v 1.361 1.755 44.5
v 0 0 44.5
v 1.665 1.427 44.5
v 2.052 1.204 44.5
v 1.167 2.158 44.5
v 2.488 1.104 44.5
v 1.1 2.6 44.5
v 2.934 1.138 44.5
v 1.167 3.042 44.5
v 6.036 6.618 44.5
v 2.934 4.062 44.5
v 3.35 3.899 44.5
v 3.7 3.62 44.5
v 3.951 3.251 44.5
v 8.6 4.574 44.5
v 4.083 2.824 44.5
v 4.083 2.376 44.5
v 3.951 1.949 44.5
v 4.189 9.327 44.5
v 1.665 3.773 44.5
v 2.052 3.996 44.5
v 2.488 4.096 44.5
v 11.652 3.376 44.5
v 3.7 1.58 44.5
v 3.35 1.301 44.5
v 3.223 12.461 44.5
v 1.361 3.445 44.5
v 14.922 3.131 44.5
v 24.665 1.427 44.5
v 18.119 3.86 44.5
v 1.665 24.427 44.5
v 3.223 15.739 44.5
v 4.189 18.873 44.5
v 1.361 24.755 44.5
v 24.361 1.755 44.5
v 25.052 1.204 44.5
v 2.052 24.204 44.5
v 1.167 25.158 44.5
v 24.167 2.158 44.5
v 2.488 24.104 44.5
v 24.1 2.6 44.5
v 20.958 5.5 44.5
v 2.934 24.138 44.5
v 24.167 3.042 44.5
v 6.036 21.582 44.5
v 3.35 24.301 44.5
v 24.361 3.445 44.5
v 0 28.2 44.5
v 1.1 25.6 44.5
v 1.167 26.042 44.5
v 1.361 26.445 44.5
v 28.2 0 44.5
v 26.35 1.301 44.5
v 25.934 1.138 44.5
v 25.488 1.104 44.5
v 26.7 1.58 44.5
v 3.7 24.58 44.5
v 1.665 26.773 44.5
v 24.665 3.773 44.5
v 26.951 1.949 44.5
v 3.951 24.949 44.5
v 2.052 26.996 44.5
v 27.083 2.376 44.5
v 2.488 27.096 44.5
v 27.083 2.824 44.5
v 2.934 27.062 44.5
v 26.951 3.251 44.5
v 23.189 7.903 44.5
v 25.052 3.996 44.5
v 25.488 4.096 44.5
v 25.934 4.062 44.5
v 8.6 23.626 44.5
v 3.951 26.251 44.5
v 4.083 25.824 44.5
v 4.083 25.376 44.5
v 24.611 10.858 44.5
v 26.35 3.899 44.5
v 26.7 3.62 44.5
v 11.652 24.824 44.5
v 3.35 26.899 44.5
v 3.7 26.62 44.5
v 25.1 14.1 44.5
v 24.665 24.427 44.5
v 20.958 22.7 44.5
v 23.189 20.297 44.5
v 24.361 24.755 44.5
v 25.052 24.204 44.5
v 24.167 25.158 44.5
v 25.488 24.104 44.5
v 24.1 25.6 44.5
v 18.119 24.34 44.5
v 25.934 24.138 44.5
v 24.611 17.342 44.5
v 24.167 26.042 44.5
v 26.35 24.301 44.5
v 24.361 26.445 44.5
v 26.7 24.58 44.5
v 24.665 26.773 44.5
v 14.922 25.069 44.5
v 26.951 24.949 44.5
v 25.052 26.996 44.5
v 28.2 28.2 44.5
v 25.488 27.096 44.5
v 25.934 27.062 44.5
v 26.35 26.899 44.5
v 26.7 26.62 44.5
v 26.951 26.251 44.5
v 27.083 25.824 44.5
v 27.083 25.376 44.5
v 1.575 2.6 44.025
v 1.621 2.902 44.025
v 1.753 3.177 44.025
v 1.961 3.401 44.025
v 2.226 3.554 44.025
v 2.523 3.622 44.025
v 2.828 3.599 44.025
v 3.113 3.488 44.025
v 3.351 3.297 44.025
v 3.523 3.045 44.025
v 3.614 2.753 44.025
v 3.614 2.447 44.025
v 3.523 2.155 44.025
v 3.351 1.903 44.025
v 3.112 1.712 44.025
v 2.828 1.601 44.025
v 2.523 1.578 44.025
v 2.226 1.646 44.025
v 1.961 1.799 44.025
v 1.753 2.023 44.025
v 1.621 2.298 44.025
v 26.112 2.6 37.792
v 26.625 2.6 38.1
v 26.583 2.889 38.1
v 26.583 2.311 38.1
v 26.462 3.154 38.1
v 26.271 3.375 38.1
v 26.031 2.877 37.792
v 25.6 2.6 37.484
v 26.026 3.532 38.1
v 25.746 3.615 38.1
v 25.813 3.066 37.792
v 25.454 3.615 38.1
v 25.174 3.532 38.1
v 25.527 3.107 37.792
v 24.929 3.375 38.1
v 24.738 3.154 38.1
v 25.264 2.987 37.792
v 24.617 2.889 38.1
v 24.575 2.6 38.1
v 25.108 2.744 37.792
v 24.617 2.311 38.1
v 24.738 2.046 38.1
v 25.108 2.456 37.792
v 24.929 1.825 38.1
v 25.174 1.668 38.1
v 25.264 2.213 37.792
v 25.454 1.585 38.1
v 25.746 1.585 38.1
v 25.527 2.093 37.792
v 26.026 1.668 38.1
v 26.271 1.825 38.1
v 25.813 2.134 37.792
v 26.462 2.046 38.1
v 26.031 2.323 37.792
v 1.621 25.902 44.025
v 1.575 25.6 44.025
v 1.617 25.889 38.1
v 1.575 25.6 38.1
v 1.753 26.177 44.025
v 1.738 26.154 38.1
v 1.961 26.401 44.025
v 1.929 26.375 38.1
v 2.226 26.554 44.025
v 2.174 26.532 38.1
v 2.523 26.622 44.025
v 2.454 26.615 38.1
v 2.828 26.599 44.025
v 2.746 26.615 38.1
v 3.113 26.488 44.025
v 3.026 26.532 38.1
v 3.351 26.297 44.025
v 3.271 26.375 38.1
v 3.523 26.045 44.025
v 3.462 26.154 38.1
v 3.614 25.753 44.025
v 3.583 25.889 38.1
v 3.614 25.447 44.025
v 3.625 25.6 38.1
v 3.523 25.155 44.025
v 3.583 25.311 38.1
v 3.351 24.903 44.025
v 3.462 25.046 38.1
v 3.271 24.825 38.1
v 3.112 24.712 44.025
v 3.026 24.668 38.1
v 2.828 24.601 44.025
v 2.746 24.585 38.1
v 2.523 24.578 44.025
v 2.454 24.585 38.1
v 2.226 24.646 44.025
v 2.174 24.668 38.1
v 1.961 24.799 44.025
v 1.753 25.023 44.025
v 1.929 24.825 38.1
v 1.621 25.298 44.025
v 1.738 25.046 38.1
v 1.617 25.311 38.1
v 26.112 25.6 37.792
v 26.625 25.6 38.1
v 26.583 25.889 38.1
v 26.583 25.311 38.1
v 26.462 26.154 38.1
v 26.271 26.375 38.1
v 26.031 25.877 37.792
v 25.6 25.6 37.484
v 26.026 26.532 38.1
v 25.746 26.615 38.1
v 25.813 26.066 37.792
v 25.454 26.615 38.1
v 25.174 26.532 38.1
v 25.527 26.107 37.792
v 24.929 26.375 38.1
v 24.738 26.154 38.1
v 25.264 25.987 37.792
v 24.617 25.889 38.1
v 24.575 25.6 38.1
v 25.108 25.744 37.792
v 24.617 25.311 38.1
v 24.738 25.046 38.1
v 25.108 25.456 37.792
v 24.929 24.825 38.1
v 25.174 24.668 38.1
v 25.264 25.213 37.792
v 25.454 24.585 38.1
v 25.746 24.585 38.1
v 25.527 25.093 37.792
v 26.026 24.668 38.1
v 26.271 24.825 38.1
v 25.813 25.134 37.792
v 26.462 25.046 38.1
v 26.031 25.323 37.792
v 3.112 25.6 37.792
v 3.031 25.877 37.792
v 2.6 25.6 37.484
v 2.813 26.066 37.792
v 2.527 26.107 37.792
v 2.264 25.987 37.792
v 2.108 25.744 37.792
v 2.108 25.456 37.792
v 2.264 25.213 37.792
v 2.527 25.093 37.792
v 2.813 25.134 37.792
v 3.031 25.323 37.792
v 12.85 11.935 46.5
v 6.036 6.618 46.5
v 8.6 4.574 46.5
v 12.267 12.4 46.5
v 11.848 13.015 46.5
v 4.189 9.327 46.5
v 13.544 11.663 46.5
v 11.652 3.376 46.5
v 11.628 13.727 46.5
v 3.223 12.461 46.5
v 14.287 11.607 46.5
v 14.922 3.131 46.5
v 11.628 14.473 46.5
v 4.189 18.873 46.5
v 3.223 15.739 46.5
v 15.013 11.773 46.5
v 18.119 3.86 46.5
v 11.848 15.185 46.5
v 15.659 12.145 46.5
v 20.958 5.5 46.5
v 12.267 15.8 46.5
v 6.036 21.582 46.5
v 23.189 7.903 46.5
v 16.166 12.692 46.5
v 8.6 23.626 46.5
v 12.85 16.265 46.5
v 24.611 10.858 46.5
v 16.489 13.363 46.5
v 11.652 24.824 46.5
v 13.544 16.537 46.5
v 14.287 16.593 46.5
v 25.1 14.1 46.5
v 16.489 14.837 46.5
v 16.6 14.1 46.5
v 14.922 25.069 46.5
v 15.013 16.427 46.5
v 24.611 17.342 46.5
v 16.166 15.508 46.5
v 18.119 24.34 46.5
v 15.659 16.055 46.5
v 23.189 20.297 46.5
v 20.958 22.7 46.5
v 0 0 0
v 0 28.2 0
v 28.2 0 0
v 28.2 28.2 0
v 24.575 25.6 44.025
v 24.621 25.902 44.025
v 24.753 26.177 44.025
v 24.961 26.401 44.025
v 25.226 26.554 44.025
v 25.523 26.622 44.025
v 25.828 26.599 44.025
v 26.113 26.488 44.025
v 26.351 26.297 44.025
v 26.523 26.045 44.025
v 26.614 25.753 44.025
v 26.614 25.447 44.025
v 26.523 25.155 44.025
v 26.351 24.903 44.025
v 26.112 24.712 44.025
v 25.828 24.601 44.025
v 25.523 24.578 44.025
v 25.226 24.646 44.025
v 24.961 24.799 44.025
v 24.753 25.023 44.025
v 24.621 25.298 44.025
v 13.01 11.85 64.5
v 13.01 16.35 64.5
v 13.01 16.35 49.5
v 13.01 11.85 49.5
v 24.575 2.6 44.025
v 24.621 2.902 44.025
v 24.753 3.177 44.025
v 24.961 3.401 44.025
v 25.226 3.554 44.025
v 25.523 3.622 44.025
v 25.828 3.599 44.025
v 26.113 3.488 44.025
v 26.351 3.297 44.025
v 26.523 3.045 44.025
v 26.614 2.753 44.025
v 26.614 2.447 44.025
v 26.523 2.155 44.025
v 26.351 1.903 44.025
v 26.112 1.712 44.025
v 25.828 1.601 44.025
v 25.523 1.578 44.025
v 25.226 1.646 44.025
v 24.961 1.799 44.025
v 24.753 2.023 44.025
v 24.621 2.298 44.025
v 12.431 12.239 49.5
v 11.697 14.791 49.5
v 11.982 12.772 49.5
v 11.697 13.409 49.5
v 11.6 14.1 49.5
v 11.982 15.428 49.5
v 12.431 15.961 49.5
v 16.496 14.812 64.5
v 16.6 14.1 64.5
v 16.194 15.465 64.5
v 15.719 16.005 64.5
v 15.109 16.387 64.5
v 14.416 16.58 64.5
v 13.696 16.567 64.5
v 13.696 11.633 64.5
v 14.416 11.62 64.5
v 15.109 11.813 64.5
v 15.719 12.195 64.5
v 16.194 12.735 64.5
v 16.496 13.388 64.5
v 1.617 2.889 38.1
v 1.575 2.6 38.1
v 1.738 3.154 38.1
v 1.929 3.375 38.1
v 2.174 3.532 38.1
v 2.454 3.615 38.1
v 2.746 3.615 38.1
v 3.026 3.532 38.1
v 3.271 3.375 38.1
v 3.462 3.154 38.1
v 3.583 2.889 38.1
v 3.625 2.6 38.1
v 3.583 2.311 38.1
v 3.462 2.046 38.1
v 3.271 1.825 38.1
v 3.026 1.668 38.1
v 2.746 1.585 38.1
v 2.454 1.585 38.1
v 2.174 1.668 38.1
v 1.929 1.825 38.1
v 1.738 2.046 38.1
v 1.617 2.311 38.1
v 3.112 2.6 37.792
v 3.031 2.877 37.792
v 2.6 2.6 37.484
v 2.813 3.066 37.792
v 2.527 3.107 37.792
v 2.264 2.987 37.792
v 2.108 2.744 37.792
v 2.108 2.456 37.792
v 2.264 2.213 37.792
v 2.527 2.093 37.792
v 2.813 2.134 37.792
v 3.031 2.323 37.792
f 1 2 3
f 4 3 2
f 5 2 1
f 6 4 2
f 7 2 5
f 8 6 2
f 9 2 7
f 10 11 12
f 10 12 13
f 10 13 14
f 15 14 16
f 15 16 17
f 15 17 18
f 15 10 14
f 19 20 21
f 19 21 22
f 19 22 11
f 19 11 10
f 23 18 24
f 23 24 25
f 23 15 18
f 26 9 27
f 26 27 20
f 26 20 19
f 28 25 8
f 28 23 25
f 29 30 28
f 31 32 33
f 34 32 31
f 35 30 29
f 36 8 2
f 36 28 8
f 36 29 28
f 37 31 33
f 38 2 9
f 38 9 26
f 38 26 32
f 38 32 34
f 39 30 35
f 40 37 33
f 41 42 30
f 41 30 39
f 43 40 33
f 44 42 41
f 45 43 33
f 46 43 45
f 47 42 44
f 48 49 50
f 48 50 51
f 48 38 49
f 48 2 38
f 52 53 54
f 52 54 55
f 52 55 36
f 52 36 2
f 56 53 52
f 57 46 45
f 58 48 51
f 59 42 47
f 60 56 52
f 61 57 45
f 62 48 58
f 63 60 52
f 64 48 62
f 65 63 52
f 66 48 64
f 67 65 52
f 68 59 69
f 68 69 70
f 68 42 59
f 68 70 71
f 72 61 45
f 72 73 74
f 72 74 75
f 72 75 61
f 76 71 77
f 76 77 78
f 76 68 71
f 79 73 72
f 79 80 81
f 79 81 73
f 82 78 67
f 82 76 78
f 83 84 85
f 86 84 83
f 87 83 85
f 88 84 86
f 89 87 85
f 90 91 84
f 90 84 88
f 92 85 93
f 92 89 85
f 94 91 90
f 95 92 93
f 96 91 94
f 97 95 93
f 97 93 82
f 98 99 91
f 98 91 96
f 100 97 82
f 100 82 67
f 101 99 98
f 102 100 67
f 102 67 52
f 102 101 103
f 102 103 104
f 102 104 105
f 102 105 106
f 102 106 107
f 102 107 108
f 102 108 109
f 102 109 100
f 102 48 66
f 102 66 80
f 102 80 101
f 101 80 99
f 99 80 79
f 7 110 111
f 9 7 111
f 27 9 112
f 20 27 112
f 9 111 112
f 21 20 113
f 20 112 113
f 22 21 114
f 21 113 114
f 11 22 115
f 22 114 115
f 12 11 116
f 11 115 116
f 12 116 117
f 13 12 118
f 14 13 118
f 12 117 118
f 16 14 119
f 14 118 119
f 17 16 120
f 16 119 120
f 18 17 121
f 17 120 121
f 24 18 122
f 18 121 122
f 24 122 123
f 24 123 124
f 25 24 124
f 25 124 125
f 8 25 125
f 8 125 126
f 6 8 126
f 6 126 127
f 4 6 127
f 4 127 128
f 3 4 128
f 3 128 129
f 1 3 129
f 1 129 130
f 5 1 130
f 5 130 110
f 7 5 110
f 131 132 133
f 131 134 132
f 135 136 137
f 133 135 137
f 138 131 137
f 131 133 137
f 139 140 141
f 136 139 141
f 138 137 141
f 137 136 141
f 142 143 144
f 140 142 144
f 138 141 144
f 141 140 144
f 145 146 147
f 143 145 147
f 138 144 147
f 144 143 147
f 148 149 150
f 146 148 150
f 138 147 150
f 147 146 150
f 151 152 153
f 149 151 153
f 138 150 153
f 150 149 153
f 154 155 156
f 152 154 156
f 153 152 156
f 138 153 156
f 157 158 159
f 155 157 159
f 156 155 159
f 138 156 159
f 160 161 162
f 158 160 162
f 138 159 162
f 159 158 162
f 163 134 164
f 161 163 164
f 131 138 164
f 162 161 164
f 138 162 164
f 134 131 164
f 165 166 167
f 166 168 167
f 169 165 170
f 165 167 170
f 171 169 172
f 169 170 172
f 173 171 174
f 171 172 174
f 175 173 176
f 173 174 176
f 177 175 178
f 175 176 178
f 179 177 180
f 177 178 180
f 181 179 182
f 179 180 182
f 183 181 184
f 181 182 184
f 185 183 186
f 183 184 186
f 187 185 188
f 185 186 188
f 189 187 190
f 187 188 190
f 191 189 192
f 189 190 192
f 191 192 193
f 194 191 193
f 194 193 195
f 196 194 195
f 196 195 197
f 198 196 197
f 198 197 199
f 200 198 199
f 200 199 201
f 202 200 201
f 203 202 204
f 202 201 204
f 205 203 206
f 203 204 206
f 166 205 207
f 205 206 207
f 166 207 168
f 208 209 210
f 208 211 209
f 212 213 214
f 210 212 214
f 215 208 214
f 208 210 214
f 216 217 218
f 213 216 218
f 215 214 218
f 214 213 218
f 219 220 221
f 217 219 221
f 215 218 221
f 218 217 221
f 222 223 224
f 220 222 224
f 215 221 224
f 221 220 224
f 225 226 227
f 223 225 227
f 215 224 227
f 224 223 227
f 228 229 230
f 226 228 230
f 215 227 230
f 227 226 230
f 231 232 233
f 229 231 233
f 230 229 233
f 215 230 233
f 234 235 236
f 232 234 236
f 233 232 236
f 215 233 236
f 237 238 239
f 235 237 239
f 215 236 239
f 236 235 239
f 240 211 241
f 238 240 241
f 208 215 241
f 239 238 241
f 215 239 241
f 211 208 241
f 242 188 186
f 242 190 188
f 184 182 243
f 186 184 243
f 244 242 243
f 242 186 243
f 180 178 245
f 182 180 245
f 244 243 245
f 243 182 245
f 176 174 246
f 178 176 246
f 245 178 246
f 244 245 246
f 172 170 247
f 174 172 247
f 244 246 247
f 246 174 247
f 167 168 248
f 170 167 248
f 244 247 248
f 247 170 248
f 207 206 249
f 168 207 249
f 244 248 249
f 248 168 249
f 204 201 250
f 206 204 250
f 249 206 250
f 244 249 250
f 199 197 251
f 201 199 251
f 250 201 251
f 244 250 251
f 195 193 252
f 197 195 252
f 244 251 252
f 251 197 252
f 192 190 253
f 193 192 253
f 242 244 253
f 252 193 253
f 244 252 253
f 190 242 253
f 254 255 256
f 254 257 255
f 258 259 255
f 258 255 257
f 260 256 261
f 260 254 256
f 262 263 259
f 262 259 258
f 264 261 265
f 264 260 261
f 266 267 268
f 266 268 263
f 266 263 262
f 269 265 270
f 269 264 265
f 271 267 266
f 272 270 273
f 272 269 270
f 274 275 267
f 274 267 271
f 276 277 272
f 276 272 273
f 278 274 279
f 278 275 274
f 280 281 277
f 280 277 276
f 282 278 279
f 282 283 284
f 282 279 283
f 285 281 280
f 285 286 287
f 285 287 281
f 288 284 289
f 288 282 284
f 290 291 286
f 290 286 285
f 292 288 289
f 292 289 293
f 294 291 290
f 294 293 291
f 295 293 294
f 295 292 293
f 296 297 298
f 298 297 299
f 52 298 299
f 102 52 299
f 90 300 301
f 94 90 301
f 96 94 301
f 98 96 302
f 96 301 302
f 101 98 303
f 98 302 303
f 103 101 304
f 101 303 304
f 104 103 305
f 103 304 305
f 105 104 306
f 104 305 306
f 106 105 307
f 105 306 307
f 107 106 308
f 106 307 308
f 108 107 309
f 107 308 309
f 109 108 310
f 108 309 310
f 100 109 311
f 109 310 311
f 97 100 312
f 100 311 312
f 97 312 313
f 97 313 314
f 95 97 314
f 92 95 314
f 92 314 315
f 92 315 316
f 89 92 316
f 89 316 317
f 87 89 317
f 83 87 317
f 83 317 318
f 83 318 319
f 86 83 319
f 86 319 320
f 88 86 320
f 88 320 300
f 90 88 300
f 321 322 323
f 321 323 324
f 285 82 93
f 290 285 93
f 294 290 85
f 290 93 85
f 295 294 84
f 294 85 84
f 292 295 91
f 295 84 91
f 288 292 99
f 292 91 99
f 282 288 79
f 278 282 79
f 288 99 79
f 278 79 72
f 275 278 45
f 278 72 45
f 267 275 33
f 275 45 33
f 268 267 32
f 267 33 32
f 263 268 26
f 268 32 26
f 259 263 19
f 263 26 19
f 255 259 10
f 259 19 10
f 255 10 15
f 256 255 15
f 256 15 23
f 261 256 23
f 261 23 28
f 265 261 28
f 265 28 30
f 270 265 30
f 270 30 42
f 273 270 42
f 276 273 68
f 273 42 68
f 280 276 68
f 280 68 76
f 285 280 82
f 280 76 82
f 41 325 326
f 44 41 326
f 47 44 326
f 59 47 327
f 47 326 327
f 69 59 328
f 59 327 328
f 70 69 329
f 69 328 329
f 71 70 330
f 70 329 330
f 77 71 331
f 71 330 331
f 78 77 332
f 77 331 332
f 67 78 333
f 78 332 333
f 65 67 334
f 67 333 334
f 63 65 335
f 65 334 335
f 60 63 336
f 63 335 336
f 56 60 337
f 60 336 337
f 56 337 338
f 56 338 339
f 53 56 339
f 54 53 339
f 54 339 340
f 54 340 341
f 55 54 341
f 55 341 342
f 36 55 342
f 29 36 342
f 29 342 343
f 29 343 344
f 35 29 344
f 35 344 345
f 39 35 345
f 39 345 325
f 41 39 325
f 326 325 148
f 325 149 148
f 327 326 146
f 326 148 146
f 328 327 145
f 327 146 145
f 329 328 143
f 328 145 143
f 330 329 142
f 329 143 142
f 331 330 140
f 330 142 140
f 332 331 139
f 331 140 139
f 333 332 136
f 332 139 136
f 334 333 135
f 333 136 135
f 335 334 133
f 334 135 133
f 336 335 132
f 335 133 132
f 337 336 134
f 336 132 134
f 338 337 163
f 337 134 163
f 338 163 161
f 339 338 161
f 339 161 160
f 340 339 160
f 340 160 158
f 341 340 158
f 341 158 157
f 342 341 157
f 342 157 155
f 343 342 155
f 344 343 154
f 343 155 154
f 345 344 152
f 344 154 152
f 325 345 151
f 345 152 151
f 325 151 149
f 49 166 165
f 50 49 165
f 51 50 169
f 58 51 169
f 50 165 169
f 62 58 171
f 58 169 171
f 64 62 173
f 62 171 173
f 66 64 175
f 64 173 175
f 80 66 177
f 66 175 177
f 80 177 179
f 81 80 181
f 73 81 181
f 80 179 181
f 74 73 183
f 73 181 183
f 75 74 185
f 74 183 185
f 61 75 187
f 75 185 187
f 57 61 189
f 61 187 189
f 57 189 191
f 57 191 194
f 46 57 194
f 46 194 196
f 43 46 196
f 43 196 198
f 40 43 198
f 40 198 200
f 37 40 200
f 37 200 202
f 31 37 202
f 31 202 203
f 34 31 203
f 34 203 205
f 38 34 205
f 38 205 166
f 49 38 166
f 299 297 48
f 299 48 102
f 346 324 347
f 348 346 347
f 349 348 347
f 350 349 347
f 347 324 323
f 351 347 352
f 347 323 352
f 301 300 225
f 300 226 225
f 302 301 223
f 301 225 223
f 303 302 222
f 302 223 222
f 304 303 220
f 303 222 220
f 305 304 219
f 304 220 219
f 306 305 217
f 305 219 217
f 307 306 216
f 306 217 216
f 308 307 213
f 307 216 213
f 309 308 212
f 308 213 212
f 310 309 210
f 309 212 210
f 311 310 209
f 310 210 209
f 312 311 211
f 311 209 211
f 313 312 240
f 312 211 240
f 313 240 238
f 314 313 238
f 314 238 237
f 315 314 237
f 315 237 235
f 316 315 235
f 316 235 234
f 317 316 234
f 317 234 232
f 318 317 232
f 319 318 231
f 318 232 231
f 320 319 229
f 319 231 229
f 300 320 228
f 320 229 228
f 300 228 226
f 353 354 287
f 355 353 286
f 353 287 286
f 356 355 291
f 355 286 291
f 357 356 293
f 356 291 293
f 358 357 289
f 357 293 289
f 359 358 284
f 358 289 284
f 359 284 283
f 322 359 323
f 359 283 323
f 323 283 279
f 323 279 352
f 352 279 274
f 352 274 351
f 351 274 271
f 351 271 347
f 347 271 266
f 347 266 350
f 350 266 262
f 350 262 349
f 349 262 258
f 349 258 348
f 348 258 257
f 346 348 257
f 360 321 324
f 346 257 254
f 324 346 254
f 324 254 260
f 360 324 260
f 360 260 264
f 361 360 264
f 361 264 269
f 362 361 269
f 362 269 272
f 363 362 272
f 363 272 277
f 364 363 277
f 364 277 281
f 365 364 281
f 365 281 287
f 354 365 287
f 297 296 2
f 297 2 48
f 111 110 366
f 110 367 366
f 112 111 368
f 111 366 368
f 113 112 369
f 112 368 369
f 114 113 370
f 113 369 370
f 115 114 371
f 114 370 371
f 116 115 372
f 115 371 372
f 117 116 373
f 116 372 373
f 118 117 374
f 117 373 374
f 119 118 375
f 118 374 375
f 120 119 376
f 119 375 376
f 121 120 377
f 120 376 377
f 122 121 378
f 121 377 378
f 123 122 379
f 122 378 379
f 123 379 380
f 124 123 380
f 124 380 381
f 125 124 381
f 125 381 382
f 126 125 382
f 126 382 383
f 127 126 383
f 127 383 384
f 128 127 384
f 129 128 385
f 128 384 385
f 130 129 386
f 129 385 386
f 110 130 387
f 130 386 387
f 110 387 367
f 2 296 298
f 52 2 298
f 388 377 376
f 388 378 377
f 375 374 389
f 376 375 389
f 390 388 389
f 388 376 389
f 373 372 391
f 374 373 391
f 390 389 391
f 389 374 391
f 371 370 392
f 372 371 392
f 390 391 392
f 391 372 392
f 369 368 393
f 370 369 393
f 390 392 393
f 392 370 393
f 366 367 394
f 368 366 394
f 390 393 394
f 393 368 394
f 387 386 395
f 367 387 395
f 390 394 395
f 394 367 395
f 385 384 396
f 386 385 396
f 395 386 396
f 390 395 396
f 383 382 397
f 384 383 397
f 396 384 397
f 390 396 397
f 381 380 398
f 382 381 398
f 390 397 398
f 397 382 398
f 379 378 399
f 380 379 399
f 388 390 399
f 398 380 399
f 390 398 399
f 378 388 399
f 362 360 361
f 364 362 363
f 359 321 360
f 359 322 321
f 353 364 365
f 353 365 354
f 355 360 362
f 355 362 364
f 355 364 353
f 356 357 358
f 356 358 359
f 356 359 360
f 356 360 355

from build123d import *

# Parameters (mm, degrees)
SKETCH1_W                          = 28.2
SKETCH1_H                          = 28.2
BOSS_EXTRUDE1_DEPTH                = 44.5
M2_5X0_45_TAPPED_HOLE1_D           = 2.05
M2_5X0_45_TAPPED_HOLE1_DEPTH       = 6.4
M2_5X0_45_TAPPED_HOLE1_CSINK_D     = 3
M2_5X0_45_TAPPED_HOLE1_CSINK_ANGLE = 90
M2_5X0_45_TAPPED_HOLE1_TIP         = 0.615882135
SKETCH15_R                         = 11
BOSS_EXTRUDE2_DEPTH                = 2
SKETCH16_R                         = 2.5
BOSS_EXTRUDE3_DEPTH                = 18
CUT_EXTRUDE1_DEPTH                 = 15


with BuildPart() as part:
    # Sketch1 → Boss-Extrude1 (new body)
    with BuildSketch(Plane.XY):
        with Locations((14.1, 14.1)):
            Rectangle(SKETCH1_W, SKETCH1_H)
    extrude(amount=BOSS_EXTRUDE1_DEPTH)

    # M2.5x0.45 Tapped Hole1
    with Locations(Plane.XY.offset(44.5)):
        with Locations((25.6, 2.6), (25.6, 25.6), (2.6, 2.6), (2.6, 25.6)):
            CounterSinkHole(M2_5X0_45_TAPPED_HOLE1_D / 2, M2_5X0_45_TAPPED_HOLE1_CSINK_D / 2, depth=M2_5X0_45_TAPPED_HOLE1_DEPTH, counter_sink_angle=M2_5X0_45_TAPPED_HOLE1_CSINK_ANGLE)
            with Locations((0, 0, -(M2_5X0_45_TAPPED_HOLE1_DEPTH + M2_5X0_45_TAPPED_HOLE1_TIP / 2))):  # 118° drill point
                Cone(0, M2_5X0_45_TAPPED_HOLE1_D / 2, M2_5X0_45_TAPPED_HOLE1_TIP, mode=Mode.SUBTRACT)

    # Sketch15 → Boss-Extrude2 (add)
    with BuildSketch(Plane.XY.offset(44.5)):
        with Locations((14.1, 14.1)):
            Circle(SKETCH15_R)
    extrude(amount=BOSS_EXTRUDE2_DEPTH)

    # Sketch16 → Boss-Extrude3 (add)
    with BuildSketch(Plane.XY.offset(46.5)):
        with Locations((14.1, 14.1)):
            Circle(SKETCH16_R)
    extrude(amount=BOSS_EXTRUDE3_DEPTH)

    # Sketch17 → Cut-Extrude1 (cut)
    with BuildSketch(Plane.XY.offset(64.5)):
        with BuildLine():
            Line((13.010275264, 16.35), (13.010275264, 11.85))
            ThreePointArc((13.010275264, 11.85), (11.6, 14.1), (13.010275264, 16.35))
        make_face()
    extrude(amount=-CUT_EXTRUDE1_DEPTH, mode=Mode.SUBTRACT)


solid = part.part
